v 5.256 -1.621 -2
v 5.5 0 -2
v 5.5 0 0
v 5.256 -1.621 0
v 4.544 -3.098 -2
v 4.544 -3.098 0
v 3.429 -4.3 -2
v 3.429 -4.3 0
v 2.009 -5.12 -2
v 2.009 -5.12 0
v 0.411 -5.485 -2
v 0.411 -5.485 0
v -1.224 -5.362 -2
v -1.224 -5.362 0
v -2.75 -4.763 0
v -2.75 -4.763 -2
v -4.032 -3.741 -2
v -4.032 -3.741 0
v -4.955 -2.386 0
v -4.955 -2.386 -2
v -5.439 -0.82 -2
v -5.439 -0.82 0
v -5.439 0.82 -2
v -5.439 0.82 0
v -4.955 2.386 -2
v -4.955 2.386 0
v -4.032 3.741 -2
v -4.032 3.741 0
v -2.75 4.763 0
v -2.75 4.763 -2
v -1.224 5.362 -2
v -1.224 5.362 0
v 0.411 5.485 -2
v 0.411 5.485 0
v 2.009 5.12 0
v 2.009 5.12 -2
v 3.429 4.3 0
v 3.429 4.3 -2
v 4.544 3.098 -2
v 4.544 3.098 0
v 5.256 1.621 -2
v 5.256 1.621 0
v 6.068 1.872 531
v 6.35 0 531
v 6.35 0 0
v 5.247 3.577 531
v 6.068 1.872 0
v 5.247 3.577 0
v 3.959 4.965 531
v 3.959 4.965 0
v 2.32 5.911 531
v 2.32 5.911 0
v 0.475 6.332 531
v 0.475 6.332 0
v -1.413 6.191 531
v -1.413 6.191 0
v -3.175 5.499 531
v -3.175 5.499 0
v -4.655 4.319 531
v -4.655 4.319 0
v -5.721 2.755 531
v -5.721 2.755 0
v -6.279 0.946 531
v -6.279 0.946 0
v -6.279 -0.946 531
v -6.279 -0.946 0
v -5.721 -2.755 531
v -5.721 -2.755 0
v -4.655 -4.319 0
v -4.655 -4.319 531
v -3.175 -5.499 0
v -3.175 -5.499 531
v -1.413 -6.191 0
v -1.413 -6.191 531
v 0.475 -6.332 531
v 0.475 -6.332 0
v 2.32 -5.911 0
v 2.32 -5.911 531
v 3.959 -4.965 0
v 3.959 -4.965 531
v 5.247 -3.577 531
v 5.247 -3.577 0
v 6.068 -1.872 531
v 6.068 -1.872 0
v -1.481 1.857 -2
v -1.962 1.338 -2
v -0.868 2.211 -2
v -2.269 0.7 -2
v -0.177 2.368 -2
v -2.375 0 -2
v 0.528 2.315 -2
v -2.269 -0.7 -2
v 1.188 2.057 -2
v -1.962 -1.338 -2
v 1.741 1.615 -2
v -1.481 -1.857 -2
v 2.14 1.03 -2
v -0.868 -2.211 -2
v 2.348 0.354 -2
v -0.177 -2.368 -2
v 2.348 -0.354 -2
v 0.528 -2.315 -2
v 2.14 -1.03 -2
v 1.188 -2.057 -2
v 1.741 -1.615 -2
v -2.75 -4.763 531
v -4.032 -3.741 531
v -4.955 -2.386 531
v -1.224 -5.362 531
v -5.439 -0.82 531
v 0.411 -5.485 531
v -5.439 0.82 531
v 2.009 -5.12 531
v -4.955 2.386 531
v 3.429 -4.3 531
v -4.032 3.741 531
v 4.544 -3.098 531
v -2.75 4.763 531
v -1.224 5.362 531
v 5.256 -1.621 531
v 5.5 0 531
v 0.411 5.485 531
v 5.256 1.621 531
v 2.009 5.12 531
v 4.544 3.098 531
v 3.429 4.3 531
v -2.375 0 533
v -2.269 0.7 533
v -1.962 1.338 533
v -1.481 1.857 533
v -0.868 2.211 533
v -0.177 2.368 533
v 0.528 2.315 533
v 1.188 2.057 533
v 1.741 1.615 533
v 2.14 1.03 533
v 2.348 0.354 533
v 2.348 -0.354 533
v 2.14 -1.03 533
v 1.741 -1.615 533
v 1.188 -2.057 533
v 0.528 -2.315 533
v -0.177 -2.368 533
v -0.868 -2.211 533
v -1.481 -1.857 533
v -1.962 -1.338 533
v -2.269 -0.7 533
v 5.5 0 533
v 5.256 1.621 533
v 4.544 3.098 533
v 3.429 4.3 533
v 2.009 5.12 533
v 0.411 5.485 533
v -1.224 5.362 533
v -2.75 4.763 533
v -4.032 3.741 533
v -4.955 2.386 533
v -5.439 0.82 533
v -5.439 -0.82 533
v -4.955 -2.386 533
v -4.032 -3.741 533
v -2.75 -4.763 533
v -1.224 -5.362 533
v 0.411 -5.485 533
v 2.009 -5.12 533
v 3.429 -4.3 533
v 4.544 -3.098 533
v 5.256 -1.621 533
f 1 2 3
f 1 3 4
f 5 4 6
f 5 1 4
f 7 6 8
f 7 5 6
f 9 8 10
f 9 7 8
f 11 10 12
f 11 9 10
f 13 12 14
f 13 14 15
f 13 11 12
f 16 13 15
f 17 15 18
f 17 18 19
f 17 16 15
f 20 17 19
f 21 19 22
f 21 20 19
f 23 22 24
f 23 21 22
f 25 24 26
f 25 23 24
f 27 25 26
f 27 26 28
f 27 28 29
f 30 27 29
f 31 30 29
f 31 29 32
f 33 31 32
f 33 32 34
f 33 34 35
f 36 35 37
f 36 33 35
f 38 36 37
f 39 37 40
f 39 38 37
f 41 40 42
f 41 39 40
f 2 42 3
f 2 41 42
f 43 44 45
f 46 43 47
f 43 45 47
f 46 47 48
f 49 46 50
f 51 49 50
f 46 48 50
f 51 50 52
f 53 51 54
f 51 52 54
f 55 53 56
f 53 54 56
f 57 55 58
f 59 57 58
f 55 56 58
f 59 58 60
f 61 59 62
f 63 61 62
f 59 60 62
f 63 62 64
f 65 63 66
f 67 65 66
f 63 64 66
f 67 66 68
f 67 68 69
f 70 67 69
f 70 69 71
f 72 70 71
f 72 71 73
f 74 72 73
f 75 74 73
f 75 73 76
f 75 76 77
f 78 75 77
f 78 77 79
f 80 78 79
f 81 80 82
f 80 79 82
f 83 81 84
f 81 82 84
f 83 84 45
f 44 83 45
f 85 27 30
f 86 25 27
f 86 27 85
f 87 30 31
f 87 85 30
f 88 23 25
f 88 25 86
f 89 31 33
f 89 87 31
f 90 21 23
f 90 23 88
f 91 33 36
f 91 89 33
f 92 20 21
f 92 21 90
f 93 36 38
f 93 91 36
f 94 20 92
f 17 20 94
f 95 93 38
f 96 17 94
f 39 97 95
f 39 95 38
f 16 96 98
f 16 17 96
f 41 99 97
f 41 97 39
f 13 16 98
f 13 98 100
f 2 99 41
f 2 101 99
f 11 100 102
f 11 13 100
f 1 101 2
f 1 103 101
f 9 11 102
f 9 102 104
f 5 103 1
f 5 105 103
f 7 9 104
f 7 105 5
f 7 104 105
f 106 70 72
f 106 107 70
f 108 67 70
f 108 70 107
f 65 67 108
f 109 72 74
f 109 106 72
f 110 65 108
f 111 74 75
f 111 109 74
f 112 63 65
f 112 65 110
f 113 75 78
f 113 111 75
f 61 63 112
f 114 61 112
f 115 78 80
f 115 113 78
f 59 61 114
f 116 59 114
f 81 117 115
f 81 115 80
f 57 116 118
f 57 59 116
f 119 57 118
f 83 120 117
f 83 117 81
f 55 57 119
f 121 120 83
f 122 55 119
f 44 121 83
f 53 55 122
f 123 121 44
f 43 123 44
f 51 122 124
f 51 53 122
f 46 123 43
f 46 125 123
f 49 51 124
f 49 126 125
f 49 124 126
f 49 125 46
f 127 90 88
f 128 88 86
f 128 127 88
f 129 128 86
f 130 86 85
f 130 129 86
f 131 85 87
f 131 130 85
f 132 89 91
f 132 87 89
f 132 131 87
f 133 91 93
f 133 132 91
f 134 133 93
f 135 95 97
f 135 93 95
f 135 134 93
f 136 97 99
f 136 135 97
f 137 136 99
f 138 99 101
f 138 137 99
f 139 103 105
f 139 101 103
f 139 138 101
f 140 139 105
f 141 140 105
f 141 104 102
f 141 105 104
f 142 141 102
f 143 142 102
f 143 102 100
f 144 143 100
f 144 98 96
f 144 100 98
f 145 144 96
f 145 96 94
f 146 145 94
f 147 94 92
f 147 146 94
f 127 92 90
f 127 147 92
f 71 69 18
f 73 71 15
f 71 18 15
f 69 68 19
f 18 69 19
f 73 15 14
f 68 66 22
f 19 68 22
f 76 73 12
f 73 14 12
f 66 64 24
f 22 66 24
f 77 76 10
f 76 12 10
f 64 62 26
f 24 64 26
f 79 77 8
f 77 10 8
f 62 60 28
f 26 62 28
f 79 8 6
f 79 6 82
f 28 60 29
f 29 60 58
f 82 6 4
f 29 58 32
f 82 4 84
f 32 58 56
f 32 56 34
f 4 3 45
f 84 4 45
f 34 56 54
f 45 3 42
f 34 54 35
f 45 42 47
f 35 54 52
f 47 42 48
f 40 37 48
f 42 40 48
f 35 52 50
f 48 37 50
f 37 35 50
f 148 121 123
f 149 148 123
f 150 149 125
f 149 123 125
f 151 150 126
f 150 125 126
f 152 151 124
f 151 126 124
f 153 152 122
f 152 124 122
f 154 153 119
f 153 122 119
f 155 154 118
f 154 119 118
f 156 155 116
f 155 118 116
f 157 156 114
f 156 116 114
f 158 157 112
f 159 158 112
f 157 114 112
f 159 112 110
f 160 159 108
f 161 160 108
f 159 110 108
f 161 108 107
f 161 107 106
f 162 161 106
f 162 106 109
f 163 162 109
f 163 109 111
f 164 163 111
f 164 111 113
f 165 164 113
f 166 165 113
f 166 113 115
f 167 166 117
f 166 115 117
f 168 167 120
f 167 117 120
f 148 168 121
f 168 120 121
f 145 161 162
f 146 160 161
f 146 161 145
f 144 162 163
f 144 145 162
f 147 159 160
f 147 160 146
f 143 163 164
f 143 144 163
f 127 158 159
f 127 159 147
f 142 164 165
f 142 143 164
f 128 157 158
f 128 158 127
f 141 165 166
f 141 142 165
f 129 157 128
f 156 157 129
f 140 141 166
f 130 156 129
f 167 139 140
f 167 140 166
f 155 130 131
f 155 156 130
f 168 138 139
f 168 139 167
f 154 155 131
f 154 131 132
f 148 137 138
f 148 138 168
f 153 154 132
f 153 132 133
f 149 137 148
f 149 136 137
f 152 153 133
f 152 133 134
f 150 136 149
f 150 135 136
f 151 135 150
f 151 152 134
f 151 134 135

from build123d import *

# Parameters (mm, degrees)
SKETCH1_R               = 6.35
BOSS_EXTRUDE1_DEPTH     = 531
SKETCH2_R               = 5.5
BOSS_EXTRUDE2_DEPTH     = 2
BOSS_EXTRUDE3_START     = 2
SKETCH3_R               = 5.5
BOSS_EXTRUDE3_DEPTH     = 2
CUT_EXTRUDE1_DEPTH      = 536.075363851
CUT_EXTRUDE1_DEPTH_BACK = 536.075363851
SKETCH4_R               = 2.375


with BuildPart() as part:
    # Sketch1 → Boss-Extrude1 (new body)
    with BuildSketch(Plane.XY):
        Circle(SKETCH1_R)
    extrude(amount=BOSS_EXTRUDE1_DEPTH)

    # Sketch2 → Boss-Extrude2 (add)
    with BuildSketch(Plane.XY.offset(531)):
        Circle(SKETCH2_R)
    extrude(amount=BOSS_EXTRUDE2_DEPTH)

    # Sketch3 → Boss-Extrude3 (add)
    with BuildSketch(Plane(origin=(0, 0, 0), x_dir=(-1, 0, 0), z_dir=(0, 0, -1)).offset(BOSS_EXTRUDE3_START)):
        with Locations(Location((0, 0, 0), (0, 0, 180))):
            Circle(SKETCH3_R)
    extrude(amount=-BOSS_EXTRUDE3_DEPTH)

    # Sketch4 → Cut-Extrude1 (cut, two sides: drawn at the far end of the back side and taken through both)
    with BuildSketch(Plane(origin=(0, 0, -2), x_dir=(-1, 0, 0), z_dir=(0, 0, -1)).offset(-CUT_EXTRUDE1_DEPTH_BACK)):
        Circle(SKETCH4_R)
    extrude(amount=CUT_EXTRUDE1_DEPTH + CUT_EXTRUDE1_DEPTH_BACK, mode=Mode.SUBTRACT)


solid = part.part
